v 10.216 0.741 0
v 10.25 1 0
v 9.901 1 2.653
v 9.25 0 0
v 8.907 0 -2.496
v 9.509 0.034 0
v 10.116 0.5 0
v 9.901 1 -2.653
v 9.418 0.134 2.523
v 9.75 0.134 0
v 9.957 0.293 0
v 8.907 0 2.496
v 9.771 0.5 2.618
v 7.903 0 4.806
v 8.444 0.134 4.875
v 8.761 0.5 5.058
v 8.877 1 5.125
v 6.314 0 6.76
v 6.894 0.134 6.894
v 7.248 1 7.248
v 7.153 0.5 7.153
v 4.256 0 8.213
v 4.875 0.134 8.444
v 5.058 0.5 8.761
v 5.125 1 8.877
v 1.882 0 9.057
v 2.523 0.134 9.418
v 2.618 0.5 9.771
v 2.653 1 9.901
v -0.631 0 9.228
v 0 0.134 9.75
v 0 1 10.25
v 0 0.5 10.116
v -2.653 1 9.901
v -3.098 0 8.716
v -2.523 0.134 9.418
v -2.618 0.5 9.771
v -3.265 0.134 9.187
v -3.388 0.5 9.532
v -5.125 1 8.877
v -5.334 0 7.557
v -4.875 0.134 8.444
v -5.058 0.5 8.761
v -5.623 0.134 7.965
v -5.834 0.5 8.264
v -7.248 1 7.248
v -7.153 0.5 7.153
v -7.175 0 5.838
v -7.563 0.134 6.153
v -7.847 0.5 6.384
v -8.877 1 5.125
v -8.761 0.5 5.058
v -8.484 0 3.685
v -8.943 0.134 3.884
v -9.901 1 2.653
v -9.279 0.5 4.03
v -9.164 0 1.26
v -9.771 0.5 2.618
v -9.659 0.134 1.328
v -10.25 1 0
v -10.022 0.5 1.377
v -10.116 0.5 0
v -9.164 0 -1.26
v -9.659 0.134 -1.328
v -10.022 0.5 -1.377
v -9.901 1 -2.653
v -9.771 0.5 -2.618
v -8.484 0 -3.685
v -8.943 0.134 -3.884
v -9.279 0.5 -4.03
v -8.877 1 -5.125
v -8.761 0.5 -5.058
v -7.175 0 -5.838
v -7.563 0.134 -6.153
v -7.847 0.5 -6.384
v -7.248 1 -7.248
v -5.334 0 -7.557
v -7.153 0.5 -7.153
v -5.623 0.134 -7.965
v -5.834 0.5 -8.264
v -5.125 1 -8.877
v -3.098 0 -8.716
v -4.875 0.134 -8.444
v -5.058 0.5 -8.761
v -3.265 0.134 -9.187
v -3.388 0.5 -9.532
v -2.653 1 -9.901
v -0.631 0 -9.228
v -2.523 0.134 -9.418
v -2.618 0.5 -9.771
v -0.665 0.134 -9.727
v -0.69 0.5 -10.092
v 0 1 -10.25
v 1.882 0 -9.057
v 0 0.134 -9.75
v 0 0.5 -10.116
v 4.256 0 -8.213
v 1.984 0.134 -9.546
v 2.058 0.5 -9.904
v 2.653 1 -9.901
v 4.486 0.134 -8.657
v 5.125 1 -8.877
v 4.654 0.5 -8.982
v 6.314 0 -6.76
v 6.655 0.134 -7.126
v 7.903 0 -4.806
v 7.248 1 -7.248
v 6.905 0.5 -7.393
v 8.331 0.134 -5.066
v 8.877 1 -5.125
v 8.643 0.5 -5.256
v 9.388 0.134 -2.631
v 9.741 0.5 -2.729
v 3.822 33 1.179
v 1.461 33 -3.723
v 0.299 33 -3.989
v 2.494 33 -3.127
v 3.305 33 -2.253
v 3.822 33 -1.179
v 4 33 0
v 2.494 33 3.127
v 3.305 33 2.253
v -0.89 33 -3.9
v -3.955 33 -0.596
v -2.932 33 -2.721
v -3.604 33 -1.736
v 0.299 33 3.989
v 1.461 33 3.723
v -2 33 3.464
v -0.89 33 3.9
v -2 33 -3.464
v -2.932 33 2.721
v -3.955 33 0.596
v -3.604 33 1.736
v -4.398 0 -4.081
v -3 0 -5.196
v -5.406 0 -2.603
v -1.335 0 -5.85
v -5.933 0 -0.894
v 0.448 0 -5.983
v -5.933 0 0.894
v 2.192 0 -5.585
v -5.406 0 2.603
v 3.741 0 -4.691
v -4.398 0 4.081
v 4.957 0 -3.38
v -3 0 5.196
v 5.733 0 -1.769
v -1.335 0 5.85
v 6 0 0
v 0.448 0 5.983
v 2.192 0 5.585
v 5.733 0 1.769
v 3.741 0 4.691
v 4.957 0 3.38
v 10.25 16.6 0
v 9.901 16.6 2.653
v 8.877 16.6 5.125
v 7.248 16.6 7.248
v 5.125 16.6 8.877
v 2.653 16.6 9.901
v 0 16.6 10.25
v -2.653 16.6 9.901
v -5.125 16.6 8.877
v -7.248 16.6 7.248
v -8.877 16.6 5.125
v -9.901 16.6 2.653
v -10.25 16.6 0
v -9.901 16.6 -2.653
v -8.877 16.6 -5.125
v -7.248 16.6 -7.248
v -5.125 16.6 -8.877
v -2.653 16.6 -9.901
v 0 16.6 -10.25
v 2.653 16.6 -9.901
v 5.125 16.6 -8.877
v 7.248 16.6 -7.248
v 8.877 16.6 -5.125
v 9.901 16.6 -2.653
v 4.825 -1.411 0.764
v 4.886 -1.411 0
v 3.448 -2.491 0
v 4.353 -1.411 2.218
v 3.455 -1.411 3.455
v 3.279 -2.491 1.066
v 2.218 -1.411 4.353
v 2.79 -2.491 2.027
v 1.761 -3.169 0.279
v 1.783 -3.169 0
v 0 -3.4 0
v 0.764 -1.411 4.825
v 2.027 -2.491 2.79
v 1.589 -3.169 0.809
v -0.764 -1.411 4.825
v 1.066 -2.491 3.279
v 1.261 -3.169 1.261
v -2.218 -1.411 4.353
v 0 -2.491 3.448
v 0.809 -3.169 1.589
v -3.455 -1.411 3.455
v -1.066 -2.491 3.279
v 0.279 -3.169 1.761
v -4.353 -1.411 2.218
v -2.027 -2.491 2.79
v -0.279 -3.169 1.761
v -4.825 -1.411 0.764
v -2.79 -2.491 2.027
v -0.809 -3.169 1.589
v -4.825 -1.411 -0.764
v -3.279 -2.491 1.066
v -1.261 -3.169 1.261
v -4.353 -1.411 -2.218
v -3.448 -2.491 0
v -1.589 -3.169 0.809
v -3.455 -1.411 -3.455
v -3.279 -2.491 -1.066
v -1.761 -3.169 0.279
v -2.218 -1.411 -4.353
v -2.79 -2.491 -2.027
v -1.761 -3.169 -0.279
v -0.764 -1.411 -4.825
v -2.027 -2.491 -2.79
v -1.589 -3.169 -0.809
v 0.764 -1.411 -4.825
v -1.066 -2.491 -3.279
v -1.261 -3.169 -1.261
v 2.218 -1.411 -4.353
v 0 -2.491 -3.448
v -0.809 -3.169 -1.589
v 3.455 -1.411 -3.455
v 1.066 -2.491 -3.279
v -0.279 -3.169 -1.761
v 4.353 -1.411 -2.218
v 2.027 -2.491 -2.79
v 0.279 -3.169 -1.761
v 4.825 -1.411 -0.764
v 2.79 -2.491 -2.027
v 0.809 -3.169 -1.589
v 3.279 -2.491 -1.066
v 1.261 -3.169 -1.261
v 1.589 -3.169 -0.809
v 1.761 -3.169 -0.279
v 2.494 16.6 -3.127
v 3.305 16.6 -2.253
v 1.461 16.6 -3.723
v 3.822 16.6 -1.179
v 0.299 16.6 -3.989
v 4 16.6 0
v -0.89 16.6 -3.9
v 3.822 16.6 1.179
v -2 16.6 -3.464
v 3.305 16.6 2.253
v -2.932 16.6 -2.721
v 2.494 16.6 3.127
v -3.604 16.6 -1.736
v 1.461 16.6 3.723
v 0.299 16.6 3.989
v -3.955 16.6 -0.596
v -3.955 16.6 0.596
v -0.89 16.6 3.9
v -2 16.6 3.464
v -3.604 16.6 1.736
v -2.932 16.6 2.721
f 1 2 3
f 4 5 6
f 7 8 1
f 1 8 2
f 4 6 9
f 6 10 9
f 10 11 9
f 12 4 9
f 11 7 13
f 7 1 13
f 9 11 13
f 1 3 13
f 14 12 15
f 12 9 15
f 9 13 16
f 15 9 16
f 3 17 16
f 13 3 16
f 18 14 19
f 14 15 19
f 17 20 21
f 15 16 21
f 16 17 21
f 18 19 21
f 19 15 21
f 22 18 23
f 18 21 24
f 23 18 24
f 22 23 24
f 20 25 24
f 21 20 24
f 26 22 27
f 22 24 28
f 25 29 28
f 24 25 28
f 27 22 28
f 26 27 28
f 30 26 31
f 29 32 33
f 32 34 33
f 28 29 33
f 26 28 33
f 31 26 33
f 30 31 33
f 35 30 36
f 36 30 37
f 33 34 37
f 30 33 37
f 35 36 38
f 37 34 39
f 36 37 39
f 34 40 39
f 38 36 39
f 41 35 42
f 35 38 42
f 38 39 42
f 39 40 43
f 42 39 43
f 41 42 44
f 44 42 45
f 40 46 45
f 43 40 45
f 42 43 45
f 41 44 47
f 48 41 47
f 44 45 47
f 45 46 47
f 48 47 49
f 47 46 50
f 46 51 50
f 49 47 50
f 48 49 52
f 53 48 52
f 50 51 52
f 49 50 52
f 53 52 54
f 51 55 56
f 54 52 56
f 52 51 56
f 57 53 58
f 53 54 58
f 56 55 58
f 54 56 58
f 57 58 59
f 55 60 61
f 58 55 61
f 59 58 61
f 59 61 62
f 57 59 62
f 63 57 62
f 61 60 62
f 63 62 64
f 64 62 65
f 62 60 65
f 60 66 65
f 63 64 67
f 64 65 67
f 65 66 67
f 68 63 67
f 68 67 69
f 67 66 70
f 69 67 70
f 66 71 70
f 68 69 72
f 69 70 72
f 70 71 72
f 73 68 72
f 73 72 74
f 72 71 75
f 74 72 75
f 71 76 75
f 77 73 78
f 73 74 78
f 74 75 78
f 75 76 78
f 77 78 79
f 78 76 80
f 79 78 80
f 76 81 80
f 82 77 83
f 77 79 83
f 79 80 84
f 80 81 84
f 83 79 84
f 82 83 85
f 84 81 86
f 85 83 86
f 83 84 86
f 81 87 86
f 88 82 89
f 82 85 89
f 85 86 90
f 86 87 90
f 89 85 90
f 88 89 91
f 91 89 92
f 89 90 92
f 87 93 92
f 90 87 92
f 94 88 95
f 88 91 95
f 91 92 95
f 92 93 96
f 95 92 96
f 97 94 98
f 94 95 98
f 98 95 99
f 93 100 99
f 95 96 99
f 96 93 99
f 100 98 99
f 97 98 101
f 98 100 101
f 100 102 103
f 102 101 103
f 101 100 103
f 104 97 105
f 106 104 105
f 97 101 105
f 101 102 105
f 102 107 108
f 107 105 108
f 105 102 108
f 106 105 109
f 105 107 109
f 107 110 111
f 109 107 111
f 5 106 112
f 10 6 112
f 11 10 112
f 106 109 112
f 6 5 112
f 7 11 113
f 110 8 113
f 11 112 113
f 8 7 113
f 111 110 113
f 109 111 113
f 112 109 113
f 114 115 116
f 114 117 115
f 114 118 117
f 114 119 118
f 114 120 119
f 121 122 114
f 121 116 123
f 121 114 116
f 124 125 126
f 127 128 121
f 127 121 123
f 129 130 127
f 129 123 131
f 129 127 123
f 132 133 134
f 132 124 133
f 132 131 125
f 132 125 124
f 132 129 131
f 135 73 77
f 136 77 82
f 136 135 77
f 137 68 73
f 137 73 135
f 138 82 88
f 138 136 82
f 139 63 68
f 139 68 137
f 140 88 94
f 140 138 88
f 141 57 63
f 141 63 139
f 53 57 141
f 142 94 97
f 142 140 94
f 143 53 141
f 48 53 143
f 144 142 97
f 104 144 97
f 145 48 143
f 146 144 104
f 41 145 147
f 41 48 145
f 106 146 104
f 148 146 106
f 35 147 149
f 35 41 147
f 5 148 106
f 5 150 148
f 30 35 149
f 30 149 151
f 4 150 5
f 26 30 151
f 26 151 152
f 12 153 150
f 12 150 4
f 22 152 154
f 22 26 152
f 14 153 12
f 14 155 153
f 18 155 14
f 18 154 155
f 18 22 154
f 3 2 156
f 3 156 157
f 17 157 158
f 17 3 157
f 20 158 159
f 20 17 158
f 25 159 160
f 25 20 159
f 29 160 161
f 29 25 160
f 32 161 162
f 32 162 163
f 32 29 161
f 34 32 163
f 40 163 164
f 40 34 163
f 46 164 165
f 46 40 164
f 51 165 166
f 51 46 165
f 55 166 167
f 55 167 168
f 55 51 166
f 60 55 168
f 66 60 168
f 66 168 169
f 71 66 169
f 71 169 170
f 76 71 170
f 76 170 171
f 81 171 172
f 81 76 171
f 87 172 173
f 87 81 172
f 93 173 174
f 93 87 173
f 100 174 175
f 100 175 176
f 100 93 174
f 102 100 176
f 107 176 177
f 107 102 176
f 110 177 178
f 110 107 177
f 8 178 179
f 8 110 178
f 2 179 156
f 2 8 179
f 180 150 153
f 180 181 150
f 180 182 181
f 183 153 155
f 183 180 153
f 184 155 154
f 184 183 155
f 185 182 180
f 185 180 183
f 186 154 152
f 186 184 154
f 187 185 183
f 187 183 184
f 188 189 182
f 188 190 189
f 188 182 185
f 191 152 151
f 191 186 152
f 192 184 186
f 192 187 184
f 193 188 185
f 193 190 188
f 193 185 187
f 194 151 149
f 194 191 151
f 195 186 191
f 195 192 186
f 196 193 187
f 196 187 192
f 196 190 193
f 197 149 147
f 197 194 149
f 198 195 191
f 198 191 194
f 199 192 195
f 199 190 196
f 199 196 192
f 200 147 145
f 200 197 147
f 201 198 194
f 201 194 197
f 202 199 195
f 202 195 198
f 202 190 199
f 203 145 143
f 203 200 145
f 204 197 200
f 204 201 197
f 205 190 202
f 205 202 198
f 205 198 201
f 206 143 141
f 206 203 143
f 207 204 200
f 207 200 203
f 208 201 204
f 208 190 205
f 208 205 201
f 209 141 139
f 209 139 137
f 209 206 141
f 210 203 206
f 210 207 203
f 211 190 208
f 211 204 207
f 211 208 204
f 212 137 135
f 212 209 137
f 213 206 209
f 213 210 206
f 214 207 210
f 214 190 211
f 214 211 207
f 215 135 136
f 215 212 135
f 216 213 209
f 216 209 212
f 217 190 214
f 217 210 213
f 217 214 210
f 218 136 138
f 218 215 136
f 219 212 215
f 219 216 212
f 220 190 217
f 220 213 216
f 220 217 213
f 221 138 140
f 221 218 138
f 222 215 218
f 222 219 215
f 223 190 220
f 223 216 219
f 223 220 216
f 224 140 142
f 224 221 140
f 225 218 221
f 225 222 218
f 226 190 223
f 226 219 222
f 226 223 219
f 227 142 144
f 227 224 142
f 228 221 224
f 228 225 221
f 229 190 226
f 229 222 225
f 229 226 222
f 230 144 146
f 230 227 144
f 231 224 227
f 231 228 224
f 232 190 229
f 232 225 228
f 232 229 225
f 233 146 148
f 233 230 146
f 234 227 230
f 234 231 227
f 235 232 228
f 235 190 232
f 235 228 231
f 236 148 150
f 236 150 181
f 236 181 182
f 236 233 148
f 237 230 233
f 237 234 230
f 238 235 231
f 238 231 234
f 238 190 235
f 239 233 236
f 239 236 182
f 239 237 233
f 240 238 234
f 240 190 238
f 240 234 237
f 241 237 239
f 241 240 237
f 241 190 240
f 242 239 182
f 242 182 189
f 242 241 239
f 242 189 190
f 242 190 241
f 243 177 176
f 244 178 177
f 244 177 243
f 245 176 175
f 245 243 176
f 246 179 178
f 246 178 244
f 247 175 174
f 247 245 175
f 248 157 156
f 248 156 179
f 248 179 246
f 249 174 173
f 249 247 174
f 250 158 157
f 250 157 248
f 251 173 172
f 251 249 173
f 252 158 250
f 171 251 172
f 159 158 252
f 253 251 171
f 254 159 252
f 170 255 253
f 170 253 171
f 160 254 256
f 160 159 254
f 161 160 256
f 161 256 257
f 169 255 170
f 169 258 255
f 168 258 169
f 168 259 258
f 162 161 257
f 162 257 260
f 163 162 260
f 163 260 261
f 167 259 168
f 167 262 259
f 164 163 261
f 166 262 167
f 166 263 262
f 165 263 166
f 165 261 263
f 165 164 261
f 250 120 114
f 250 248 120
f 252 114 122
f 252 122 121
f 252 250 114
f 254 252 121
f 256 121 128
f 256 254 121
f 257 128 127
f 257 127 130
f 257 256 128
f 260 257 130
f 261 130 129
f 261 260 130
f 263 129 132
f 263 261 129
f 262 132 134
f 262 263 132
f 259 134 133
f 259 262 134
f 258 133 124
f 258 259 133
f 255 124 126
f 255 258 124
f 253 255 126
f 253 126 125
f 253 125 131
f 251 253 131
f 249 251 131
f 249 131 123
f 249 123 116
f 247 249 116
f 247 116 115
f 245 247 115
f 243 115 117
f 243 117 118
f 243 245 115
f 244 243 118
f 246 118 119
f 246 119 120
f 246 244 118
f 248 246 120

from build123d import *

# Parameters (mm, degrees)
CONG_1_R = 1


with BuildPart() as part:
    # Esquisse1 → Révolution1 (revolve)
    with BuildSketch(Plane.XY):
        with BuildLine():
            Line((10.25, 0), (6, 0))
            ThreePointArc((6, 0), (3.44818793, -2.490919876), (0, -3.4))
            Line((0, -3.4), (0, 0))
            Line((0, 0), (0, 33))
            Line((0, 33), (4, 33))
            Line((4, 33), (4, 16.6))
            Line((4, 16.6), (10.25, 16.6))
            Line((10.25, 16.6), (10.25, 0))
        make_face()
    revolve(axis=Axis((0, 33, 0), (0, -1, 0)))

    # Congé1
    cong_1_edges = [part.edges().sort_by_distance(p)[0] for p in [
        (-10.25, 0, 0),
    ]]
    fillet(cong_1_edges, radius=CONG_1_R)


solid = part.part
